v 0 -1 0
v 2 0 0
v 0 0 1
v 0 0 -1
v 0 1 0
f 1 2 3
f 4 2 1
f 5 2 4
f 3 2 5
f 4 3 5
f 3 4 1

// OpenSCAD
translate([2,0,0]) {
	rotate([180,90,0]) {
	   scale([1,1,sqrt(2)])
			translate([0,0,sqrt(2)/2])
			   rotate([0,180,0])
				   cylinder(h = sqrt(2), r1 = 1, r2 = 0, center = true, $fn=4);
		if (0) {
		   translate([0,0,2])
				cylinder(h=2.5,r1=0.5,r2=0.5,cener=true, $fn=4);
		}
	}
}
